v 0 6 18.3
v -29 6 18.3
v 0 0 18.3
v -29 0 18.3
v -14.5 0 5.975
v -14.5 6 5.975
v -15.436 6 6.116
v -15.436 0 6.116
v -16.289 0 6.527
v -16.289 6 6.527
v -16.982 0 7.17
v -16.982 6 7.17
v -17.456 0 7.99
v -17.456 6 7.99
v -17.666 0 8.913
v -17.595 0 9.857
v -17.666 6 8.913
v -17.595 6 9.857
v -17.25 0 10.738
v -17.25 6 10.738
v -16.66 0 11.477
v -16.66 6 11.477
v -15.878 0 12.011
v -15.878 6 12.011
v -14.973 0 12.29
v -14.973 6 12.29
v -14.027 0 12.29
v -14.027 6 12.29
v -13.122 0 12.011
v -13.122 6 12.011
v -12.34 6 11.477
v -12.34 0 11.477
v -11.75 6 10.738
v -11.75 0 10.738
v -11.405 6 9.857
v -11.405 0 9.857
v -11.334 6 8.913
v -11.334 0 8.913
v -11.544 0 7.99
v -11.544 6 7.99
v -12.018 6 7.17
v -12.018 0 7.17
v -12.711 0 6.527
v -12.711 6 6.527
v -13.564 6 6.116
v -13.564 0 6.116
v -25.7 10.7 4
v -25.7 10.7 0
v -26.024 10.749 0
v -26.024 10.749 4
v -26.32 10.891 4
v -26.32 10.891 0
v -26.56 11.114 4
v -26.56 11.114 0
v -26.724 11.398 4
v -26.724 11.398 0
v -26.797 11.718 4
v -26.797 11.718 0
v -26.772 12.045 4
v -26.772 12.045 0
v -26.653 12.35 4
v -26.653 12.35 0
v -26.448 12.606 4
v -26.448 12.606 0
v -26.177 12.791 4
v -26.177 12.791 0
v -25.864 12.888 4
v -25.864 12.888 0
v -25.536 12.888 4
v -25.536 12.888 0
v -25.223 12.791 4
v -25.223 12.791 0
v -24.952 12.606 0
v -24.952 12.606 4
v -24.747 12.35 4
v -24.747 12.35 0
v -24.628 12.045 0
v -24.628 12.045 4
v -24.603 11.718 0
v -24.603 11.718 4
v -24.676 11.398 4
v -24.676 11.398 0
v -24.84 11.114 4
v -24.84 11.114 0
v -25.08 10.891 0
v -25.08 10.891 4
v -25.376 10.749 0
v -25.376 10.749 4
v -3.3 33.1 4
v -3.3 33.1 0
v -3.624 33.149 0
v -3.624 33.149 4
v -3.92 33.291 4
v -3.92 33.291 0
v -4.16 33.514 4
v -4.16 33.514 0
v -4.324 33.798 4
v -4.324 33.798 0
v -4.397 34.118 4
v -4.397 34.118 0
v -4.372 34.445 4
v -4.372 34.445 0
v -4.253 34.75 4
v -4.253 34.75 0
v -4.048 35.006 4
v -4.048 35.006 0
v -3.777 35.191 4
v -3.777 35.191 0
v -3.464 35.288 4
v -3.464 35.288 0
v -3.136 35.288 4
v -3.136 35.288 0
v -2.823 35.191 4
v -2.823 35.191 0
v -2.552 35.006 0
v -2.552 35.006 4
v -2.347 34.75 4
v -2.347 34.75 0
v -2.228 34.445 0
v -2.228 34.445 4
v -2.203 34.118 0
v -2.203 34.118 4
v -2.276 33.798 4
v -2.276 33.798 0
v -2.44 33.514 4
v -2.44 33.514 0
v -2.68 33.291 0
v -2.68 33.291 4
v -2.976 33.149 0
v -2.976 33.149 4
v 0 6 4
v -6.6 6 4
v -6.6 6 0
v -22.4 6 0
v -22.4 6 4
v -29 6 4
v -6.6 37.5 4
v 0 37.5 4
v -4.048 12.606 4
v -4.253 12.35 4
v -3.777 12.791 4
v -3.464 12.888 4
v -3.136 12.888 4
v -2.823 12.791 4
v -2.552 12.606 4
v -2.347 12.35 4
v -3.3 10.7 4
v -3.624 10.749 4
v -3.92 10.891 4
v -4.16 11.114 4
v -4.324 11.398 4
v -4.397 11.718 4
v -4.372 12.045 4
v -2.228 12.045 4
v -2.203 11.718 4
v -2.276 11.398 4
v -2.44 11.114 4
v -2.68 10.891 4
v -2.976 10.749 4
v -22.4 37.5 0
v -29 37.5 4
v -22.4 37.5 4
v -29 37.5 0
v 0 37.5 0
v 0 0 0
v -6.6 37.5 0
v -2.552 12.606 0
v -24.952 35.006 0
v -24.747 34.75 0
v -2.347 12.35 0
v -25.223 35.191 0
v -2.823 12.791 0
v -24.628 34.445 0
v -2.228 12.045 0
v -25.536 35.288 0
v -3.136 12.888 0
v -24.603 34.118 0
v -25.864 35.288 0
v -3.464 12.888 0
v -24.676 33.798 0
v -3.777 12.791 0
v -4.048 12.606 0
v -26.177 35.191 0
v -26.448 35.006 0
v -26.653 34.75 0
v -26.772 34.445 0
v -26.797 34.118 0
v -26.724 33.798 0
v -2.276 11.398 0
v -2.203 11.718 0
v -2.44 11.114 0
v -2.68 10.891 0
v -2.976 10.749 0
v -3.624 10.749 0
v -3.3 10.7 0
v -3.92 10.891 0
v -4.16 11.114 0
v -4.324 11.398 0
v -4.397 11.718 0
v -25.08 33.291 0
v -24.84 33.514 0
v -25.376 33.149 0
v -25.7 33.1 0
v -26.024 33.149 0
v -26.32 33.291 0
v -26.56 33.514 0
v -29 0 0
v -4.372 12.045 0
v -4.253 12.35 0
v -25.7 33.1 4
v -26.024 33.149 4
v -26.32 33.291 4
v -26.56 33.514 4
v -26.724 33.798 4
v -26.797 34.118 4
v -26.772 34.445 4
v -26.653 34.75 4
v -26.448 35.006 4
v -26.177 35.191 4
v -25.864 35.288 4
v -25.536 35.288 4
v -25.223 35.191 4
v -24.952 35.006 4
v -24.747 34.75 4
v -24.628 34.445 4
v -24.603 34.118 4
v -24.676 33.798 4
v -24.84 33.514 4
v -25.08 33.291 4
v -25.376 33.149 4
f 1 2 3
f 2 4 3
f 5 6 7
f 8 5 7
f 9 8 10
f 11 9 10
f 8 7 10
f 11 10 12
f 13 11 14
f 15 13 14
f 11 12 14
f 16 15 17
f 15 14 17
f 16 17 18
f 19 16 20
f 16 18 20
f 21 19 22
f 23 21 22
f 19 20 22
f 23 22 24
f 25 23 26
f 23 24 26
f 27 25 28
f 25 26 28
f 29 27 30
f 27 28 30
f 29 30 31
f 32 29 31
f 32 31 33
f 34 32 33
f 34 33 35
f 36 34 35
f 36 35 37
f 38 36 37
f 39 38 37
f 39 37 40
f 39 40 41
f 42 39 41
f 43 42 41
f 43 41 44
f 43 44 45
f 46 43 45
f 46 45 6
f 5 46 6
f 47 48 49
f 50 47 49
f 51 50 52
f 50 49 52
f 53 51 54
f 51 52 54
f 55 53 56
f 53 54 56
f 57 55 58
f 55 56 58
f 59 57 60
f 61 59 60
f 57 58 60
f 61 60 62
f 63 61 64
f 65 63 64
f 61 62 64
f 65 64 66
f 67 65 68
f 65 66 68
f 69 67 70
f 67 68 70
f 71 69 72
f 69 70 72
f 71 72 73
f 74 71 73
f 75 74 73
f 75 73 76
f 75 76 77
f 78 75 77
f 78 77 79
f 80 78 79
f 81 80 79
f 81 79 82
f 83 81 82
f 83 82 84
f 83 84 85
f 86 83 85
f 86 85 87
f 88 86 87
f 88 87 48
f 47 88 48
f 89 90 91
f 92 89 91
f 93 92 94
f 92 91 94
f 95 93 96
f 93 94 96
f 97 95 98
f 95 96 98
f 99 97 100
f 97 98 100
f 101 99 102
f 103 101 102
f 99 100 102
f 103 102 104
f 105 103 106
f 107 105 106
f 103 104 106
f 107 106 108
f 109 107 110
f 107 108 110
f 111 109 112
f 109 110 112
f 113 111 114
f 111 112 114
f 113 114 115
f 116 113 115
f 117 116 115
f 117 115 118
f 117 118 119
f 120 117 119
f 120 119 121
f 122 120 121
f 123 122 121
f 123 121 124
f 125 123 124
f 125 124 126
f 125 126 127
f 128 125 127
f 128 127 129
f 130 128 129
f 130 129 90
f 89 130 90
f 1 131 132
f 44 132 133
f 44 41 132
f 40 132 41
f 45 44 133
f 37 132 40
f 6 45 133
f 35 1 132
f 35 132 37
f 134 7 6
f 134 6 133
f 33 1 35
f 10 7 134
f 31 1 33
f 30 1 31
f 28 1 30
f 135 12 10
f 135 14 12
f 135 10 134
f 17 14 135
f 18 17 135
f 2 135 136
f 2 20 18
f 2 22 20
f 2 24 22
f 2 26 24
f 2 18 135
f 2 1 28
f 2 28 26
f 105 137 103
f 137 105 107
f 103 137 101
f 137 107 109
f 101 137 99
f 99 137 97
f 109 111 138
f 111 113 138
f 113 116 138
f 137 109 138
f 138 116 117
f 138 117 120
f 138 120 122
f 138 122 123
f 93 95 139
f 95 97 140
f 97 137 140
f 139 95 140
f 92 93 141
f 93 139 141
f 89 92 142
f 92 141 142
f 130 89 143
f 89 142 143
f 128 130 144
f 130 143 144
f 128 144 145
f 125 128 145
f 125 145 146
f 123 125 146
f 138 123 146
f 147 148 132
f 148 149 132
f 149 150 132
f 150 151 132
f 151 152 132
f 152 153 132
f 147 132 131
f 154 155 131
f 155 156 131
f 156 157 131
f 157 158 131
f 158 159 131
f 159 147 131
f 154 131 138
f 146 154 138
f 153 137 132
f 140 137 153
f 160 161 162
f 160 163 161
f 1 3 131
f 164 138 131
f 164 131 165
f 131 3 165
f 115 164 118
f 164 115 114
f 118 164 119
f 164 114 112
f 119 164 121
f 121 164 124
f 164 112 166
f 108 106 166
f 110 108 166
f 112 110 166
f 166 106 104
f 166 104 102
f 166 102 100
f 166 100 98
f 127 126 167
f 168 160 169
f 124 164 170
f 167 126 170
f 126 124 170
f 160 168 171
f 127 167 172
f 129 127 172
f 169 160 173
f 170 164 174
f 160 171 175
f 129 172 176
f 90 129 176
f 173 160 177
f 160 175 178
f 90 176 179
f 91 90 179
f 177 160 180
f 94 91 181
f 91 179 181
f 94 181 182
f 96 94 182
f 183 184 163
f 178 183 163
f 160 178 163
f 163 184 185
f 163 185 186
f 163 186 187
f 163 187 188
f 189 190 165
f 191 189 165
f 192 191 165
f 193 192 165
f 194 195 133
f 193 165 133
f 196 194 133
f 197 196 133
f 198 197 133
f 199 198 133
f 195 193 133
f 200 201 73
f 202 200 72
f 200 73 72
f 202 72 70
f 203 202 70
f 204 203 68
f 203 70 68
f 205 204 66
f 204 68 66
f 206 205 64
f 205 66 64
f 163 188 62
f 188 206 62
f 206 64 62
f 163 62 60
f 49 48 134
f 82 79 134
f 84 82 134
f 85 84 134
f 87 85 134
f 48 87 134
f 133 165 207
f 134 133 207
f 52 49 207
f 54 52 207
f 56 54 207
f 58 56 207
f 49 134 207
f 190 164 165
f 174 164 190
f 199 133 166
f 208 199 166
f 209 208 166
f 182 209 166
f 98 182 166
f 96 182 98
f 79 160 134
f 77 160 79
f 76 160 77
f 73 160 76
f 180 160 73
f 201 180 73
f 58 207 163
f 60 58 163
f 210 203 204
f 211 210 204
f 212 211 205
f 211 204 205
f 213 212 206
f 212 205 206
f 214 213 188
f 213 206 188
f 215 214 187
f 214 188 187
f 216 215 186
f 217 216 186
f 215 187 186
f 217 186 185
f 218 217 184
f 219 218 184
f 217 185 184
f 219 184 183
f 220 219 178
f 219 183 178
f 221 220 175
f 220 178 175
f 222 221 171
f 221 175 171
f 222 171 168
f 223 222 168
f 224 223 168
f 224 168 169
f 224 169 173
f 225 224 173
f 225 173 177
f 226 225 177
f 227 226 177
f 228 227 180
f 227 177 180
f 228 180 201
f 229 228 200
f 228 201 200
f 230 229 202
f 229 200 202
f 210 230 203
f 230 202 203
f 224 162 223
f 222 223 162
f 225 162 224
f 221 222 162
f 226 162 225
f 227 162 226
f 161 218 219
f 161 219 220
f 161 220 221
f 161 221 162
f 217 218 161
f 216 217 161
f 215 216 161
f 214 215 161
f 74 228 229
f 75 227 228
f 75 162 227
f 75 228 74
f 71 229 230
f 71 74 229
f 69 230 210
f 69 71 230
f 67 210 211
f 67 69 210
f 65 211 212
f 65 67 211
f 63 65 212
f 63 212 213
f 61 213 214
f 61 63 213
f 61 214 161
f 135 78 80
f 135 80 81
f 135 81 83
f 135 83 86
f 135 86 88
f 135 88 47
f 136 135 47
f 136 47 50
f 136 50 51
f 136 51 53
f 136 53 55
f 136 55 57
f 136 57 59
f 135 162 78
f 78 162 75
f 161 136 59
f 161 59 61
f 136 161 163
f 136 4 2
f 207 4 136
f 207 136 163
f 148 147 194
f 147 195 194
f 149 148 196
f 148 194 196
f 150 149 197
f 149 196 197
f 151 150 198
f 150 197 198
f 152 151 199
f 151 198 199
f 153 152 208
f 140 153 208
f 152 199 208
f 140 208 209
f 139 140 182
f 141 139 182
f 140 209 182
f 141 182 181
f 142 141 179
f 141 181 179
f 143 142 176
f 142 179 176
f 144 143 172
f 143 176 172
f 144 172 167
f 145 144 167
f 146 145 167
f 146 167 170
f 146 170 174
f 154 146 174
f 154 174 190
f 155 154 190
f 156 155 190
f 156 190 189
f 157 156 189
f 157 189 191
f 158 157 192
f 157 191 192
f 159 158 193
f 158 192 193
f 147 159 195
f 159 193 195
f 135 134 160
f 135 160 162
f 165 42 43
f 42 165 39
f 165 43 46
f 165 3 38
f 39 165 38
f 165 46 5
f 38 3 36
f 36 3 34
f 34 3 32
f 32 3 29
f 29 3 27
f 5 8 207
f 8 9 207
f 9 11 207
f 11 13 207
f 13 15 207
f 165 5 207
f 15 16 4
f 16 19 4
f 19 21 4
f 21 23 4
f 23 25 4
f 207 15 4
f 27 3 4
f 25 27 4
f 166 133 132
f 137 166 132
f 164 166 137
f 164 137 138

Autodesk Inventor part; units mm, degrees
ref_plane "YZ Plane" through (0, 0, 0) normal (1, 0, 0) x (0, 1, 0)
ref_plane "XZ Plane" through (0, 0, 0) normal (0, 1, 0) x (-1, 0, 0)
ref_plane "XY Plane" through (0, 0, 0) normal (0, 0, 1) x (1, 0, 0)
sketch "Sketch1" plane through (0, 0, 0) normal (0, 1, 0) x (-1, 0, 0)
  line L0 (0, 0) -> (29, 0)
  line L1 (29, 0) -> (29, 18.3)
  line L2 (29, 18.3) -> (0, 18.3)
  line L3 (0, 18.3) -> (0, 0)
  dimension "d0" = 29
  dimension "d1" = 18.3
extrude "Extrusion1" add sketch "Sketch1" along normal blind 6
sketch "Sketch2" plane through (0, 6, 0) normal (0, 1, 0) x (1, 0, 0)
  line L0 (0, 0) -> (-29, 0) projected
  line L1 (0, 0) -> (-6.6, 0)
  line L2 (-6.6, 0) -> (-6.6, -4)
  line L3 (-6.6, -4) -> (0, -4)
  line L4 (0, -4) -> (0, 0)
  dimension "d4" = 6.6
  dimension "d5" = 4
extrude "Extrusion2" add sketch "Sketch2" along normal blind 31.5
sketch "Sketch3" plane through (0, 6, 0) normal (0, 1, 0) x (1, 0, 0)
  line L0 (-6.6, 0) -> (-29, 0) projected
  line L1 (-29, 0) -> (-22.4, 0)
  line L2 (-22.4, 0) -> (-22.4, -4)
  line L3 (-22.4, -4) -> (-29, -4)
  line L4 (-29, -4) -> (-29, 0)
  point P0 (0, 0)
  dimension "d8" = 6.6
  dimension "d9" = 4
extrude "Extrusion3" add sketch "Sketch3" along normal blind 31.5
sketch "Sketch4" plane through (-6.6, 6, 4) normal (0, 0, 1) x (1, 0, 0)
  line L0 (-22.4, 0) -> (6.6, 0) projected
  point P0 (6.6, -6)
  point P1 (3.3, 5.8)
  point P2 (3.3, 5.8)
  point P3 (3.3, 28.2)
  point P4 (-19.1, 5.8)
  point P5 (-19.1, 28.2)
  dimension "d14" = 5.8
  dimension "d15" = 22.4
  dimension "d16" = 22.4
  dimension "d17" = 22.4
  dimension "d18" = 5.8
hole "Hole1" at (-3.3, 11.8, 4) at (-3.3, 34.2, 4) at (-25.7, 11.8, 4) at (-25.7, 34.2, 4) direction (0, 0, -1) diameter 2.2 end through all
sketch "Sketch5" plane through (-29, 0, 18.3) normal (0, 0, 1) x (1, 0, 0)
  point P0 (29, 0)
sketch "Sketch6" plane through (0, 0, 0) normal (0, -1, 0) x (1, 0, 0)
  line L0 (-29, 18.3) -> (0, 18.3) projected
  point P0 (0, 0)
  point P1 (-14.5, 9.15)
  dimension "d26" = 9.15
hole "Hole2" at (-14.5, 0, 9.15) direction (0, 1, 0) diameter 6.35 end through all
properties part number "adapter"
